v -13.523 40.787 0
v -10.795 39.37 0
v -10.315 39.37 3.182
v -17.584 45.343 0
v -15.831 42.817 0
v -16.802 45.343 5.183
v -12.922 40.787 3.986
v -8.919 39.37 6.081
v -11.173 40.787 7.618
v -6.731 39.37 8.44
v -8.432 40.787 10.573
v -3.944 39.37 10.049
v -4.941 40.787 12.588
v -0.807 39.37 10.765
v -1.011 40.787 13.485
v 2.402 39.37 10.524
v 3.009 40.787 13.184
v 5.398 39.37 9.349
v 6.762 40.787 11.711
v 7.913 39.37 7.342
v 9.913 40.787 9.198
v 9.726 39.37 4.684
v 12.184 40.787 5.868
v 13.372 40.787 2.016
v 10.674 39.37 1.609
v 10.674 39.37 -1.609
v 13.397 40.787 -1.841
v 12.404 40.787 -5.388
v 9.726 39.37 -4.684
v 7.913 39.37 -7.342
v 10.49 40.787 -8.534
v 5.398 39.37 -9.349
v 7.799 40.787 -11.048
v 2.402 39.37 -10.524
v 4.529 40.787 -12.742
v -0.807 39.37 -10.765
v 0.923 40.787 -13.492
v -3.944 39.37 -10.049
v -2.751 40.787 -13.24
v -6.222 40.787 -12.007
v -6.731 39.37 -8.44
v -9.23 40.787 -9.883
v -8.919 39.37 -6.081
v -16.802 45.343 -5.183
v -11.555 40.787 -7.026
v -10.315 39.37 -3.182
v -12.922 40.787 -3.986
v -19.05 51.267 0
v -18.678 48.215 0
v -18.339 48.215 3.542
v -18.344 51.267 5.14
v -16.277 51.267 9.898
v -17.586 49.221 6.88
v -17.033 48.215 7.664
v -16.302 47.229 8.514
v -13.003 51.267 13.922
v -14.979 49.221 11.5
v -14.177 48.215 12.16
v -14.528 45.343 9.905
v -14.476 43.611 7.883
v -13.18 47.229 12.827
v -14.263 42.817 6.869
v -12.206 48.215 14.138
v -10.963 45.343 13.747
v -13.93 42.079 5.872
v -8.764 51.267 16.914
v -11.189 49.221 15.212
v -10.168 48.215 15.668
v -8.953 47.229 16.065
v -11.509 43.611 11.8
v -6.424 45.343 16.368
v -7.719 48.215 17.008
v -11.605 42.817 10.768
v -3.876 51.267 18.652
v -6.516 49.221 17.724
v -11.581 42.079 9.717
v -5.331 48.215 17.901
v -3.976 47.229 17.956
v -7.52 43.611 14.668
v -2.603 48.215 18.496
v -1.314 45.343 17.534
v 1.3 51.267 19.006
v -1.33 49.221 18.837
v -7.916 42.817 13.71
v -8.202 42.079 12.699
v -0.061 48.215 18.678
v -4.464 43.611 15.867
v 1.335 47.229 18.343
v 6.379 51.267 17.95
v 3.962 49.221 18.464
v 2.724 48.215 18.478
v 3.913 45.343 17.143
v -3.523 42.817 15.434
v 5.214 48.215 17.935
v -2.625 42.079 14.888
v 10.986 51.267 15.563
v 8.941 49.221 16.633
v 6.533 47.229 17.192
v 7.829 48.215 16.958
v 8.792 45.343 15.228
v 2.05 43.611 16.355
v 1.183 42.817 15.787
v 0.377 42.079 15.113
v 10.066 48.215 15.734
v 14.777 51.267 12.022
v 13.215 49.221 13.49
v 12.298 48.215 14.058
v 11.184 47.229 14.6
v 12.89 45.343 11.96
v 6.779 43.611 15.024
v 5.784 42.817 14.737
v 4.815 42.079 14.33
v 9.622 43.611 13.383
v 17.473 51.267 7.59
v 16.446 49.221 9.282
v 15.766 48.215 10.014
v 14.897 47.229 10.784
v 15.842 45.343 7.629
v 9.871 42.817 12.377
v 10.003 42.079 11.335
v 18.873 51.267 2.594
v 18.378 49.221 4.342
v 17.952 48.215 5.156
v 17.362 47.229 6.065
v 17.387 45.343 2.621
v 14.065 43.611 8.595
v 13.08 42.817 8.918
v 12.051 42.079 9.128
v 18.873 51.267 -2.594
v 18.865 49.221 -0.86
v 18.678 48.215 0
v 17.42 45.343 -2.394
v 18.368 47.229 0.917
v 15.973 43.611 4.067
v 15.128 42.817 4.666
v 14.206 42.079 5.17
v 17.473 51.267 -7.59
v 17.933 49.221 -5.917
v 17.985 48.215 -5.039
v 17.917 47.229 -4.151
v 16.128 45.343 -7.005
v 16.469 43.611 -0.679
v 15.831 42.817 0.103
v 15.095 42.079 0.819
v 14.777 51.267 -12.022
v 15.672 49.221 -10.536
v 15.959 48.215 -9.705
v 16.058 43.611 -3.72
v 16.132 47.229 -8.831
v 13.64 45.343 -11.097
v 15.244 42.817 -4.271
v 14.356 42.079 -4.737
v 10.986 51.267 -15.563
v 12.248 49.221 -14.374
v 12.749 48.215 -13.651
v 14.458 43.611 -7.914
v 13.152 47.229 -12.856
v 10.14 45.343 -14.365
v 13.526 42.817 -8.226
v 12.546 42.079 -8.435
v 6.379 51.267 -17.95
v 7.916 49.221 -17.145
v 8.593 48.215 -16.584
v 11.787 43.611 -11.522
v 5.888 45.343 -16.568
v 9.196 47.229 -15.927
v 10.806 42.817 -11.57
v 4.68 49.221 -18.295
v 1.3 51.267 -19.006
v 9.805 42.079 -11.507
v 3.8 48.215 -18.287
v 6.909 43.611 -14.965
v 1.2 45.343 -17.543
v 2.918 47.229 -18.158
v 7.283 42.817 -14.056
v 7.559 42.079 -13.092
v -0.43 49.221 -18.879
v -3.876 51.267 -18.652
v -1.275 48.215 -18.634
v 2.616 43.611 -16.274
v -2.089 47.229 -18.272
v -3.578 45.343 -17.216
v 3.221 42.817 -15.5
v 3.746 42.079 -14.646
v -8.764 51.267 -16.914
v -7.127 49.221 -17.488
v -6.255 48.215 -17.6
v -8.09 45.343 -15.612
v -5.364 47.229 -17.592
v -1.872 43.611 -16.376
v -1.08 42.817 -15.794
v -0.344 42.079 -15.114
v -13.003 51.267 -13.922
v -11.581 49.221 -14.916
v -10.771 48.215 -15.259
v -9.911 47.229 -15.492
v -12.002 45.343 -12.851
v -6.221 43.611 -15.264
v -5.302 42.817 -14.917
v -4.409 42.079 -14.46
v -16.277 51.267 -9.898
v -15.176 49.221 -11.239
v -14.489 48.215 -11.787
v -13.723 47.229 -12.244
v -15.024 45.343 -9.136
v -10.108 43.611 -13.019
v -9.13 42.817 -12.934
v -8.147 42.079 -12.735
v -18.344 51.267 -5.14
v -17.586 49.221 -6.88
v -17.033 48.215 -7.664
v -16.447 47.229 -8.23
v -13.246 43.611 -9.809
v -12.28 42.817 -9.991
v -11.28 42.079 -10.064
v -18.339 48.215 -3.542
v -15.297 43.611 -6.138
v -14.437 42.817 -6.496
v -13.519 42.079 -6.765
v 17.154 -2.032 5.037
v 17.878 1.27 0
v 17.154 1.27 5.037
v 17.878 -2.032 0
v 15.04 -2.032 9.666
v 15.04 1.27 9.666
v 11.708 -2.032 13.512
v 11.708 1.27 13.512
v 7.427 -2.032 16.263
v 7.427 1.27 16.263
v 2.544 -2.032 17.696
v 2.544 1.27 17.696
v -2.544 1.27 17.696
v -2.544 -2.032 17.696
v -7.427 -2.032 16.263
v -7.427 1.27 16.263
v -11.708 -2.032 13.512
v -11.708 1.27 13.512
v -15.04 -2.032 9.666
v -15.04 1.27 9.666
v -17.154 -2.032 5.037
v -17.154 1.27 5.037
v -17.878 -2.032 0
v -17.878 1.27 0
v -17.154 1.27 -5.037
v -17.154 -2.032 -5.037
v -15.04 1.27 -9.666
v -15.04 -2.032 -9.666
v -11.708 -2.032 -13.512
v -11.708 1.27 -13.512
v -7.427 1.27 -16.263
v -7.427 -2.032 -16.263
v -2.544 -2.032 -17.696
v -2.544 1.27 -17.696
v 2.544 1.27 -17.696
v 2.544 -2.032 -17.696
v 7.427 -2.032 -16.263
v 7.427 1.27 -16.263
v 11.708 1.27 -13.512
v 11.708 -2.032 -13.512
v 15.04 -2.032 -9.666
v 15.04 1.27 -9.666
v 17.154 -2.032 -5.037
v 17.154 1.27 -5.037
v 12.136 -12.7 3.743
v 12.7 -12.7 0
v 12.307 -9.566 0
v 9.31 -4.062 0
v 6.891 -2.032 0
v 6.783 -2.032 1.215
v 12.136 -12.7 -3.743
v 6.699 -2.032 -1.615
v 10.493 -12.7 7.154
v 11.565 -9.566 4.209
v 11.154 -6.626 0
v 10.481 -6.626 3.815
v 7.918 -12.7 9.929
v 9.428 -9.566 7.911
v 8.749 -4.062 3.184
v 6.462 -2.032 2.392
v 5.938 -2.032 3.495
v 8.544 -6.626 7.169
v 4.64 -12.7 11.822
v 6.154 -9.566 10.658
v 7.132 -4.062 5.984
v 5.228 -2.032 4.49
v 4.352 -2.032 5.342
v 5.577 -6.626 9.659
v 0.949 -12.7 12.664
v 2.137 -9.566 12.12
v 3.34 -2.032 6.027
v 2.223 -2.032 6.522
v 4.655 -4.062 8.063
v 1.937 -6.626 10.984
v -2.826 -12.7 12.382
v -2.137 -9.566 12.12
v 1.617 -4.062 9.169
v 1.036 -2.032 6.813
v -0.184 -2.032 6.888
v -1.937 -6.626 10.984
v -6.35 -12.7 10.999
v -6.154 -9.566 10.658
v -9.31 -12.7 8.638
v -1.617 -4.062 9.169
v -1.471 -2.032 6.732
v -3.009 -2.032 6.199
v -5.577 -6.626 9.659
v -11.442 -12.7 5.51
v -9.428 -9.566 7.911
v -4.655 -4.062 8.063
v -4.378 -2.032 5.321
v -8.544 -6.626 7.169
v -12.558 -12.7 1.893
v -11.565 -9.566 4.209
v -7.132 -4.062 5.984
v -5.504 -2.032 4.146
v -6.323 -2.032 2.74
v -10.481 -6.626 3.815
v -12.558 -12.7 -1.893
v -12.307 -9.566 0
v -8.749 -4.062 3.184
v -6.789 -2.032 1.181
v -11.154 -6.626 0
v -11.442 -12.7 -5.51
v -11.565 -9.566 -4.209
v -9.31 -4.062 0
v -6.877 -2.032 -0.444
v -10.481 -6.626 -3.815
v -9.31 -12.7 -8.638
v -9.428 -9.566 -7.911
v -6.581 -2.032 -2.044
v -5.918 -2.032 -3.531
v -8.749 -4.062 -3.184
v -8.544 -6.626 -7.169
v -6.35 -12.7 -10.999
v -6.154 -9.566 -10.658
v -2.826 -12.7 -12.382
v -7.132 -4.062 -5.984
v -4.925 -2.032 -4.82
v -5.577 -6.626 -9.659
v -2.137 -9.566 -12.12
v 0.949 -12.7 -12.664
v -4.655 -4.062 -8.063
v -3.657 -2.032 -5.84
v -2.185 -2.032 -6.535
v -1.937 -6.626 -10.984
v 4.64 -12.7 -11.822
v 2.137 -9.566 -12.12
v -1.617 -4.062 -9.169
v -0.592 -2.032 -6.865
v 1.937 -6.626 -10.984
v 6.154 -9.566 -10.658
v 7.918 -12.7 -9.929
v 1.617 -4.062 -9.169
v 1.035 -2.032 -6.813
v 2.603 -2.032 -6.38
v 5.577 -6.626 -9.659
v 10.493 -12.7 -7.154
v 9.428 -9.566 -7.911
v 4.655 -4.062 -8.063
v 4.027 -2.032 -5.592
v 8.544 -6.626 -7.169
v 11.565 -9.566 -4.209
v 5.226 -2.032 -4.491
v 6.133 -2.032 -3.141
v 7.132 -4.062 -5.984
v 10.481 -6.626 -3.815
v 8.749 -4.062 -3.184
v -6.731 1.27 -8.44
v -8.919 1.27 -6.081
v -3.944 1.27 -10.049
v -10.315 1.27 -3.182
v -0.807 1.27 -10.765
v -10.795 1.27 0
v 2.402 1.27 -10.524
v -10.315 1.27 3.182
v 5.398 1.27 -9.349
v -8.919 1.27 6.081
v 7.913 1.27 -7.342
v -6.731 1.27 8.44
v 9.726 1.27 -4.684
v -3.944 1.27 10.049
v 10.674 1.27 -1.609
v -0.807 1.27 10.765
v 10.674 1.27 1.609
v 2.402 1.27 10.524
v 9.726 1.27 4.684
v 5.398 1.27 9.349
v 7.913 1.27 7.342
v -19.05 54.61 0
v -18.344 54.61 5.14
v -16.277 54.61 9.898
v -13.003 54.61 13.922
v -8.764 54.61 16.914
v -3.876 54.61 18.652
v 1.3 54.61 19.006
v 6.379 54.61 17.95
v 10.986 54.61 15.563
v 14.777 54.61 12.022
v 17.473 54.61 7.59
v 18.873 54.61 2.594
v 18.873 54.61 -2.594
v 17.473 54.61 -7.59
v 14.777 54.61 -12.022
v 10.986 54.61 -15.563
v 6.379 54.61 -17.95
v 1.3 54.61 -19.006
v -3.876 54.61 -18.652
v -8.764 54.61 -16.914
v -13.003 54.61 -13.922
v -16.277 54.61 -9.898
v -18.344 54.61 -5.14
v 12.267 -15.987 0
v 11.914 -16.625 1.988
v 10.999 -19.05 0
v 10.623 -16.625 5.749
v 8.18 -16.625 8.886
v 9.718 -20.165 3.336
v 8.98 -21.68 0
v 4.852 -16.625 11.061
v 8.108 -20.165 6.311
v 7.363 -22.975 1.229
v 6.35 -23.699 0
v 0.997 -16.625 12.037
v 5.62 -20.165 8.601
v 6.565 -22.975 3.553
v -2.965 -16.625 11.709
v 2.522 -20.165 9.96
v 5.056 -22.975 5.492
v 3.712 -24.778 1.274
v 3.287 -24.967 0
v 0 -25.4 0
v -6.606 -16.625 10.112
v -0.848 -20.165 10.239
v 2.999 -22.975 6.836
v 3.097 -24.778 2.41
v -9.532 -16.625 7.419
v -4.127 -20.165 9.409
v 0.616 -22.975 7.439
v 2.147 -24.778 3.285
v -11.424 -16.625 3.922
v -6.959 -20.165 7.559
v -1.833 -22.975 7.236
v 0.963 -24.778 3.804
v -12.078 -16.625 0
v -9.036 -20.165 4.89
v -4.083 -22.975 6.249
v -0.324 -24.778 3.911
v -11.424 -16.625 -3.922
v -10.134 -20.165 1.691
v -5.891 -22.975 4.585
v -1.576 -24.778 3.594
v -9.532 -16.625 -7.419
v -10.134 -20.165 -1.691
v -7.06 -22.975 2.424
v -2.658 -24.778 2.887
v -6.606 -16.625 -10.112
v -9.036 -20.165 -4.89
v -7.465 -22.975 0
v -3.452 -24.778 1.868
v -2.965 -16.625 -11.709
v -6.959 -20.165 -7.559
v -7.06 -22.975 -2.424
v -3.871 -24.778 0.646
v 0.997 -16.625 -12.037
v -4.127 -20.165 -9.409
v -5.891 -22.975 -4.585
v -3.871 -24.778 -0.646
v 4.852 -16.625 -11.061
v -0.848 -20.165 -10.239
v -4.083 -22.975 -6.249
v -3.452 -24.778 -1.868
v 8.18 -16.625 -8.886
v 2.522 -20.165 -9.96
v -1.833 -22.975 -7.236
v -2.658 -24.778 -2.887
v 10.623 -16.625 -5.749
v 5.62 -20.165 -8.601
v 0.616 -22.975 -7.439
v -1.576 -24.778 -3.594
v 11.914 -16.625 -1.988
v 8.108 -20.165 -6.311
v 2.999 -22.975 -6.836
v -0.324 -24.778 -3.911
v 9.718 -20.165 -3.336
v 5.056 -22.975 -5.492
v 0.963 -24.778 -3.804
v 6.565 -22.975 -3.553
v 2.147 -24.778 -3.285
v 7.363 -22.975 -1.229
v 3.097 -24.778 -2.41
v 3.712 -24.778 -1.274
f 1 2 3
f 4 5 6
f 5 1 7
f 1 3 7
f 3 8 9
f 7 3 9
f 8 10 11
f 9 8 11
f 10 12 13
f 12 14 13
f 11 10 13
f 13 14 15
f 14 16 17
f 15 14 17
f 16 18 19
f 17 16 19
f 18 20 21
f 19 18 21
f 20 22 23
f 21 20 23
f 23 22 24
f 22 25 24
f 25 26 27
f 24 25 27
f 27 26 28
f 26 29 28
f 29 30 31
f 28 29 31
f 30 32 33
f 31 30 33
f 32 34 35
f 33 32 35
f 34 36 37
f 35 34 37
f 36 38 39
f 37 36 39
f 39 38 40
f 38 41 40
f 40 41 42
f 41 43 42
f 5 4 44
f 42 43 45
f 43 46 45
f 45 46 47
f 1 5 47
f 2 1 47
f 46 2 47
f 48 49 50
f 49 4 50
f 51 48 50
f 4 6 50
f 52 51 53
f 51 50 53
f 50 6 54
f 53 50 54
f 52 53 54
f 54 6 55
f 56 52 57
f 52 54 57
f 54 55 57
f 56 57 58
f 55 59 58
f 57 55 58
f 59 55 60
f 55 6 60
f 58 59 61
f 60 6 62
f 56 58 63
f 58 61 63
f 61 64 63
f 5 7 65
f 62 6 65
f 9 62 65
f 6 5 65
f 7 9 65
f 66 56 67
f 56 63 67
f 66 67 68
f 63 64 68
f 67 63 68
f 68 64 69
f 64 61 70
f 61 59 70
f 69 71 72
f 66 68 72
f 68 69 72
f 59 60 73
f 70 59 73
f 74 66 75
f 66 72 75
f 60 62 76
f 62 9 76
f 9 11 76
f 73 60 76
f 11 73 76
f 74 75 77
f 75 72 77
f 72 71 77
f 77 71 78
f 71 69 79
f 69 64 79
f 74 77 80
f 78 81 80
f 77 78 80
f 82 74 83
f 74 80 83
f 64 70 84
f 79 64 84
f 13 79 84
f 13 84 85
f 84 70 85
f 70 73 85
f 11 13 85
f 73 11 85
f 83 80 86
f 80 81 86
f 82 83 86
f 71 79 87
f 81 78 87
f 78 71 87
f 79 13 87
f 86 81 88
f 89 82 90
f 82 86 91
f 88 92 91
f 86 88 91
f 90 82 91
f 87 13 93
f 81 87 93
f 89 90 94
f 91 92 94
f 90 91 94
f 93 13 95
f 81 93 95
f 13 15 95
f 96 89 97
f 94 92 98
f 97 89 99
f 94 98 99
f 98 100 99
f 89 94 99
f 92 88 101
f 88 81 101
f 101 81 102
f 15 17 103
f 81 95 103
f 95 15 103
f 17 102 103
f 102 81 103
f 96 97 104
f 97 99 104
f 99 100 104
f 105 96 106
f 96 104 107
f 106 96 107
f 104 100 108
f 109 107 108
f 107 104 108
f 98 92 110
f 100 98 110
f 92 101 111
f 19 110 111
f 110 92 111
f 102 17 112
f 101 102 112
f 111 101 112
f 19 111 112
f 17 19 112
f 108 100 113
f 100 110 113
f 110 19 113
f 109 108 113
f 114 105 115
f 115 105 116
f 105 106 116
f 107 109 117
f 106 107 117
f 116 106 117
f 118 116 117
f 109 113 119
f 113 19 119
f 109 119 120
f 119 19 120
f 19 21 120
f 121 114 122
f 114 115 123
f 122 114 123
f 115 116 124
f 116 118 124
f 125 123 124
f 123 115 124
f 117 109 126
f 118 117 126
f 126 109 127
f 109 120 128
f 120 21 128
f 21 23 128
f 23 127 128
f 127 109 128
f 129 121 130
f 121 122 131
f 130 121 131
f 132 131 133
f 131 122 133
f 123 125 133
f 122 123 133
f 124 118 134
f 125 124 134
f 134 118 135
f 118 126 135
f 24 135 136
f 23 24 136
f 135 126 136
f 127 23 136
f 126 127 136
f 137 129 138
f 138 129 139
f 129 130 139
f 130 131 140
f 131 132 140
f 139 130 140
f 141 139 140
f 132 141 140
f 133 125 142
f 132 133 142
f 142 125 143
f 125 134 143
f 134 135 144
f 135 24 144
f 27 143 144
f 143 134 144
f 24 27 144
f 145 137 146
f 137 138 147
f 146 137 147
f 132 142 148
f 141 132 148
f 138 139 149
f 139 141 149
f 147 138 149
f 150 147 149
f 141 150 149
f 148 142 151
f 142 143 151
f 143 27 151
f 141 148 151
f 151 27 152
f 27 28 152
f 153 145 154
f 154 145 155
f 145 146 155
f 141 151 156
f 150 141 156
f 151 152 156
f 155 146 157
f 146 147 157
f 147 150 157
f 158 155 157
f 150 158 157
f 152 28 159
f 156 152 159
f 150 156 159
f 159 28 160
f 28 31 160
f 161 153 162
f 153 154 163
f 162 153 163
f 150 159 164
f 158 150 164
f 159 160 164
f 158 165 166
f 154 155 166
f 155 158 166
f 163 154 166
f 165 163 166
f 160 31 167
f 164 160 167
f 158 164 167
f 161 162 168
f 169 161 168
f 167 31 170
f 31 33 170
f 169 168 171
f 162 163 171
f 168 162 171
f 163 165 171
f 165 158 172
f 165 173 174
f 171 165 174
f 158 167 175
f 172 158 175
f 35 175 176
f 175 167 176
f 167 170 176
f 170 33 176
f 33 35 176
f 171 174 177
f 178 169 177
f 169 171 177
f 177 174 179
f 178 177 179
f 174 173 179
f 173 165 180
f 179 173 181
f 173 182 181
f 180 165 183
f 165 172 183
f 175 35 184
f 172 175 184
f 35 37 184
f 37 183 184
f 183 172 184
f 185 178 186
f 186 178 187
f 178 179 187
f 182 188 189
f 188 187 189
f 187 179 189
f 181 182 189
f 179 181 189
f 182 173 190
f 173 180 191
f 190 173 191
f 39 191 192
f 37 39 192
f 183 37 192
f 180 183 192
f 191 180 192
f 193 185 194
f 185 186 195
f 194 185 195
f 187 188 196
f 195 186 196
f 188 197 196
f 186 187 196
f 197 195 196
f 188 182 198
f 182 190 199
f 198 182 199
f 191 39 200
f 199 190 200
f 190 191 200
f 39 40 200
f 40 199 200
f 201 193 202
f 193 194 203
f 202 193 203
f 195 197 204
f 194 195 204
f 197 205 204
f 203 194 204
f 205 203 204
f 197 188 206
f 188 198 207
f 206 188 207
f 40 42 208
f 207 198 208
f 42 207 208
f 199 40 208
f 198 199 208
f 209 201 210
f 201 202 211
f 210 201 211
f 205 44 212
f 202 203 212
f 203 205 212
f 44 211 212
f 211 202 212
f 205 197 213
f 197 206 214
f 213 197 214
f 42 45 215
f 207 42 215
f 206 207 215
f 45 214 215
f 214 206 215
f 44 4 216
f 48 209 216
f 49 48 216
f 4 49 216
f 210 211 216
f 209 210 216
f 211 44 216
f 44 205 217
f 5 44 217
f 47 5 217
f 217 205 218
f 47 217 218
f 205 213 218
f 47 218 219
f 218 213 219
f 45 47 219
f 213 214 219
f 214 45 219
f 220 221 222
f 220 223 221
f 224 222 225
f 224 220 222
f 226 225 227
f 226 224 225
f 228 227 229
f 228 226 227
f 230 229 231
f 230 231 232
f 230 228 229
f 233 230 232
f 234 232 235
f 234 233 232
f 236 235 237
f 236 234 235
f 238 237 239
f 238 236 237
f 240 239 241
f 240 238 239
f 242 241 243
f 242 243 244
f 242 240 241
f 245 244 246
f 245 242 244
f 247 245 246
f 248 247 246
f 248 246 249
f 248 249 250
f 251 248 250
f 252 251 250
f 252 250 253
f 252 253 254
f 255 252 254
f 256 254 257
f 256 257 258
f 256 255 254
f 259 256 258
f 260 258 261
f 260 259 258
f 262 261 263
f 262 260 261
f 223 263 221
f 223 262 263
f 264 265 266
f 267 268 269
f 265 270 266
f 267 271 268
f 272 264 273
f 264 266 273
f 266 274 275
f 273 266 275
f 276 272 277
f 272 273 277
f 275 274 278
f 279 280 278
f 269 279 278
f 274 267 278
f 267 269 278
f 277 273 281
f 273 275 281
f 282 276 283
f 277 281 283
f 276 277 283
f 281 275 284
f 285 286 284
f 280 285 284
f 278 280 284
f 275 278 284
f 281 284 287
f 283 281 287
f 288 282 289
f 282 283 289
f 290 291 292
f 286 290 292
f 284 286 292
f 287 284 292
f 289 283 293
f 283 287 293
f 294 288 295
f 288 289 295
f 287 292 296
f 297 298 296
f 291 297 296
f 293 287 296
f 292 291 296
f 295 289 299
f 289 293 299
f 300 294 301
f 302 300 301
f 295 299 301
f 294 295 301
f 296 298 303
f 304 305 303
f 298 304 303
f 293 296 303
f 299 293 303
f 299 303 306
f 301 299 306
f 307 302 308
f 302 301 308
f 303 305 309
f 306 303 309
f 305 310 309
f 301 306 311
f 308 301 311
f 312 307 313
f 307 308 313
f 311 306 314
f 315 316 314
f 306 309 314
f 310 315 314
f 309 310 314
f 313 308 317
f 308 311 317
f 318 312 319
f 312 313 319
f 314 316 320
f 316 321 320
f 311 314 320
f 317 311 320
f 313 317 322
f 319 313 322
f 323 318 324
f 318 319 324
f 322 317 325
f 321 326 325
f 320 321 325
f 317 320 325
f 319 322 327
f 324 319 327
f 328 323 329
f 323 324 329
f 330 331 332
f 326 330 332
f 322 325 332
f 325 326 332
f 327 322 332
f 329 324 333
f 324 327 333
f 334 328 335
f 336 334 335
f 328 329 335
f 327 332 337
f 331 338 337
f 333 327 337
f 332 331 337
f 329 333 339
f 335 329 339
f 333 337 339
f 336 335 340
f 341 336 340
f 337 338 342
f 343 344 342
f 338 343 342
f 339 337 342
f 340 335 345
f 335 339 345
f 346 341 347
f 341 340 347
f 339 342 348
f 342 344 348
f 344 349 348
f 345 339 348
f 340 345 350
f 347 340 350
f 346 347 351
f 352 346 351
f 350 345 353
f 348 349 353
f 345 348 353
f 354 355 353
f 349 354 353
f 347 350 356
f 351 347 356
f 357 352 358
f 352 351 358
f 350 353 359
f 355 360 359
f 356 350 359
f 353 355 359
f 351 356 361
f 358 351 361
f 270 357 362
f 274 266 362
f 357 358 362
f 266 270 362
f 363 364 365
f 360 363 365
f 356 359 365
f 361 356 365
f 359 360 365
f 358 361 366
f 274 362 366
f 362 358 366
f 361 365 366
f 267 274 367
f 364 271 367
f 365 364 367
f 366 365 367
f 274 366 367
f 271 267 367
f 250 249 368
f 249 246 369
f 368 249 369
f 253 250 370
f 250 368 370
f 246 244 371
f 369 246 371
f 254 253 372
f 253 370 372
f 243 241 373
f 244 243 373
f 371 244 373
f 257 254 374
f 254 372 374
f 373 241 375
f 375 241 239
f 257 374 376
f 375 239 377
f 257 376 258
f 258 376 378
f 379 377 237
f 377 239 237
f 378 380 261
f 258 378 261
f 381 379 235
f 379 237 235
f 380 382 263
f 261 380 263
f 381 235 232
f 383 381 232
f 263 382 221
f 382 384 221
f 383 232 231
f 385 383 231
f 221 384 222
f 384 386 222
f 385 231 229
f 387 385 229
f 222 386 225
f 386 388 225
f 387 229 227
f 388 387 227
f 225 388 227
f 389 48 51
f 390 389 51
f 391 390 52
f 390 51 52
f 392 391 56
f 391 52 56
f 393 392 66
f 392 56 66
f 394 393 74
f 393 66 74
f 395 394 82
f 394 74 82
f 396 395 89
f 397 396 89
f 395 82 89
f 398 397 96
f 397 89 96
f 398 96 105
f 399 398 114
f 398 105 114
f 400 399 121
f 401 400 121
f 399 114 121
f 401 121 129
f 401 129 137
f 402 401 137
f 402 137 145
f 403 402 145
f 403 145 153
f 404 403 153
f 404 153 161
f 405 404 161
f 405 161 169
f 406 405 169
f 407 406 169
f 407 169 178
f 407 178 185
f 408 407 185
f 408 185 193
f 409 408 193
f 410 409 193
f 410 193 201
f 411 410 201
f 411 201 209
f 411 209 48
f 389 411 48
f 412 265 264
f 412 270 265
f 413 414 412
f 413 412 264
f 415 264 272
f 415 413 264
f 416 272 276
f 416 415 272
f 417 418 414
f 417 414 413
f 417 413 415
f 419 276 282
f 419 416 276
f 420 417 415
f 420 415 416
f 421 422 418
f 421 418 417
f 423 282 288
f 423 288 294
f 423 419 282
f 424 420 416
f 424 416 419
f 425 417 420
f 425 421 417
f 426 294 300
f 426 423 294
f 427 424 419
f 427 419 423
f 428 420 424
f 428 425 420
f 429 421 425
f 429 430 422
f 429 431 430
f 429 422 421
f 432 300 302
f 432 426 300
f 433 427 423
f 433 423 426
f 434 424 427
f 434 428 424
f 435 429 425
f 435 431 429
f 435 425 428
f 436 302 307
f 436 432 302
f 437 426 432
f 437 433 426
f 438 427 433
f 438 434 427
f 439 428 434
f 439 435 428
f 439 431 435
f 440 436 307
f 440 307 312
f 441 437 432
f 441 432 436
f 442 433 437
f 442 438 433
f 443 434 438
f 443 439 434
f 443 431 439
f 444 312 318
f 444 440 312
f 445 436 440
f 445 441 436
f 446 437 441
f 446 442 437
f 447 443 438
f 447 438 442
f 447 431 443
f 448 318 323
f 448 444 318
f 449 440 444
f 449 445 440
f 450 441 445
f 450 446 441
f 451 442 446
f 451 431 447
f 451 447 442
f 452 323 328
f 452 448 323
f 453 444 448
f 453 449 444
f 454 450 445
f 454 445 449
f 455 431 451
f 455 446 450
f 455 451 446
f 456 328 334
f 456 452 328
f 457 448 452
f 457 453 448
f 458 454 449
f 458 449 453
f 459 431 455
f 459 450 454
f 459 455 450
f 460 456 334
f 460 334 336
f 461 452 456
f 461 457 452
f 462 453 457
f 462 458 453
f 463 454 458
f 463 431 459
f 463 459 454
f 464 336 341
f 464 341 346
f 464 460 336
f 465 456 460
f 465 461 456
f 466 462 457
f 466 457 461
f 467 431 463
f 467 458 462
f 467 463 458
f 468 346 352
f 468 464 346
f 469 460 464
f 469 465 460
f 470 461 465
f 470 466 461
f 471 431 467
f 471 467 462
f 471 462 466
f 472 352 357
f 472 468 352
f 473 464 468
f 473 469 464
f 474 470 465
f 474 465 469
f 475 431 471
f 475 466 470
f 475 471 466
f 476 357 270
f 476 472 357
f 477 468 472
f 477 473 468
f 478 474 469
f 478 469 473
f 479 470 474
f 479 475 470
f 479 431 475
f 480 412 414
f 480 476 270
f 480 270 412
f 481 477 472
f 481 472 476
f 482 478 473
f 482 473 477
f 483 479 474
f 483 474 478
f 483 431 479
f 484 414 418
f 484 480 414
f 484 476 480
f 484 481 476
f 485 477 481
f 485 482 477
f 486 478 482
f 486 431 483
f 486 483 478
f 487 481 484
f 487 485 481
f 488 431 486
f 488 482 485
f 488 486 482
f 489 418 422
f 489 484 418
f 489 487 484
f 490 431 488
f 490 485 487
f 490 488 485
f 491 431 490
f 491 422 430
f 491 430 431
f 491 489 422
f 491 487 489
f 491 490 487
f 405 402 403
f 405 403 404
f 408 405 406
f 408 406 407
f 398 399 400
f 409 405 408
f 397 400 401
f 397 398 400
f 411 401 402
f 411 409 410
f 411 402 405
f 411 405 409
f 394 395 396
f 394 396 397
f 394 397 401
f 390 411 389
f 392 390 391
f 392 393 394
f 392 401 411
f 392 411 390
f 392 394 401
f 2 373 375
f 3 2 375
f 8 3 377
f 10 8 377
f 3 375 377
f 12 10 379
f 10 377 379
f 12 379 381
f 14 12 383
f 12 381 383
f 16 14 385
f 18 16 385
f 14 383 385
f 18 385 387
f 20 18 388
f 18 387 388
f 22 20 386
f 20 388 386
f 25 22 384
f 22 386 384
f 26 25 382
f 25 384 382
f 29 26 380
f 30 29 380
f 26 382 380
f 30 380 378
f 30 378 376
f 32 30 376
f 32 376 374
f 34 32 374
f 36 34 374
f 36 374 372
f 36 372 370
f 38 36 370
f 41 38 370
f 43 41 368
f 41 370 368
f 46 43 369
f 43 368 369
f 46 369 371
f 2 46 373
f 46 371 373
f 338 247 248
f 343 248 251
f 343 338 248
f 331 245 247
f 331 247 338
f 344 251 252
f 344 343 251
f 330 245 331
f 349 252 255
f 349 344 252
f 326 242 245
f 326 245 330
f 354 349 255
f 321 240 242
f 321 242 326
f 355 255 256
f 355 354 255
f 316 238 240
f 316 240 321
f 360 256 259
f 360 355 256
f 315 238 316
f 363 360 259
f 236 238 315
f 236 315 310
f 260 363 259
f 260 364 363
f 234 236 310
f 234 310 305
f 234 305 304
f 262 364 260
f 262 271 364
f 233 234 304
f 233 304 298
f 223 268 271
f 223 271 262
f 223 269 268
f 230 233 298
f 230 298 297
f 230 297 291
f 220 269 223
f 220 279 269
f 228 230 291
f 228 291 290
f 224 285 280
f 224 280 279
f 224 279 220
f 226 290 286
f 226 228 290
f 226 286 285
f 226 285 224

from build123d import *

# Parameters (mm, degrees)
F0_R          = 12.7
F1_DEPTH      = 25.4
F2_R          = 12.7
F3_R          = 12.69999
F4_R          = 17.8783824342
F5_DEPTH      = 1.27
F5_DEPTH_BACK = 2.032
F6_R          = 10.795
F7_DEPTH      = 38.1
F8_R          = 19.05
F9_DEPTH      = 15.24


# Not quite as in the source:
# - a fillet or chamfer that OpenCascade refuses, or shapes differently, is made with other operations: its cross-section is extruded or revolved along the edge and cut away or added
# - a fillet or chamfer is up to 0.001 mm smaller than in the source, because OpenCascade refuses the exact size


with BuildPart() as f1:
    # F0 (on Front) → F1 (new body)
    with BuildSketch(Plane.XZ):
        Circle(F0_R)
    extrude(amount=F1_DEPTH)

    # F2
    f2_edges = [f1.edges().sort_by_distance(p)[0] for p in [
        (-12.7, -25.4, 0),
    ]]
    fillet(f2_edges, radius=F2_R)

    # F3 (radius 12.7 in the source; OpenCascade refuses exactly that, so slightly less here)
    f3_edges = [f1.edges().sort_by_distance(p)[0] for p in [
        (-12.7, 0, 0),
    ]]
    fillet(f3_edges, radius=F3_R)

    # F4 (on Front) → F5 (join, two sides)
    with BuildSketch(Plane.XZ) as f5_sk:
        Circle(F4_R)
    extrude(amount=-F5_DEPTH)
    extrude(f5_sk.sketch, amount=F5_DEPTH_BACK)

    # F6 (on face) → F7 (join)
    with BuildSketch(Plane(origin=(0, 1.27, 0), x_dir=(-1, 0, 0), z_dir=(0, 1, 0))):
        Circle(F6_R)
    extrude(amount=F7_DEPTH)

    # F8 (on face) → F9 (join)
    with BuildSketch(Plane(origin=(0, 39.37, 0), x_dir=(-1, 0, 0), z_dir=(0, 1, 0))):
        Circle(F8_R)
    extrude(amount=F9_DEPTH)

    # F10: fillet of radius 12.7 on 1 edges, made by hand

    # F10_s1 → F10_t2 (revolve, cut)
    with BuildSketch(Plane.XY):
        with BuildLine():
            ThreePointArc((-19.05, 51.2667211869), (-16.7841147205, 44.0266072376), (-10.795, 39.37))
            Line((-10.795, 39.37), (-19.05, 39.37))
            Line((-19.05, 39.37), (-19.05, 51.2667211869))
        make_face()
    revolve(axis=Axis((0, 39.37, 0), (0, 1, 0)), mode=Mode.SUBTRACT)


solid = f1.part
